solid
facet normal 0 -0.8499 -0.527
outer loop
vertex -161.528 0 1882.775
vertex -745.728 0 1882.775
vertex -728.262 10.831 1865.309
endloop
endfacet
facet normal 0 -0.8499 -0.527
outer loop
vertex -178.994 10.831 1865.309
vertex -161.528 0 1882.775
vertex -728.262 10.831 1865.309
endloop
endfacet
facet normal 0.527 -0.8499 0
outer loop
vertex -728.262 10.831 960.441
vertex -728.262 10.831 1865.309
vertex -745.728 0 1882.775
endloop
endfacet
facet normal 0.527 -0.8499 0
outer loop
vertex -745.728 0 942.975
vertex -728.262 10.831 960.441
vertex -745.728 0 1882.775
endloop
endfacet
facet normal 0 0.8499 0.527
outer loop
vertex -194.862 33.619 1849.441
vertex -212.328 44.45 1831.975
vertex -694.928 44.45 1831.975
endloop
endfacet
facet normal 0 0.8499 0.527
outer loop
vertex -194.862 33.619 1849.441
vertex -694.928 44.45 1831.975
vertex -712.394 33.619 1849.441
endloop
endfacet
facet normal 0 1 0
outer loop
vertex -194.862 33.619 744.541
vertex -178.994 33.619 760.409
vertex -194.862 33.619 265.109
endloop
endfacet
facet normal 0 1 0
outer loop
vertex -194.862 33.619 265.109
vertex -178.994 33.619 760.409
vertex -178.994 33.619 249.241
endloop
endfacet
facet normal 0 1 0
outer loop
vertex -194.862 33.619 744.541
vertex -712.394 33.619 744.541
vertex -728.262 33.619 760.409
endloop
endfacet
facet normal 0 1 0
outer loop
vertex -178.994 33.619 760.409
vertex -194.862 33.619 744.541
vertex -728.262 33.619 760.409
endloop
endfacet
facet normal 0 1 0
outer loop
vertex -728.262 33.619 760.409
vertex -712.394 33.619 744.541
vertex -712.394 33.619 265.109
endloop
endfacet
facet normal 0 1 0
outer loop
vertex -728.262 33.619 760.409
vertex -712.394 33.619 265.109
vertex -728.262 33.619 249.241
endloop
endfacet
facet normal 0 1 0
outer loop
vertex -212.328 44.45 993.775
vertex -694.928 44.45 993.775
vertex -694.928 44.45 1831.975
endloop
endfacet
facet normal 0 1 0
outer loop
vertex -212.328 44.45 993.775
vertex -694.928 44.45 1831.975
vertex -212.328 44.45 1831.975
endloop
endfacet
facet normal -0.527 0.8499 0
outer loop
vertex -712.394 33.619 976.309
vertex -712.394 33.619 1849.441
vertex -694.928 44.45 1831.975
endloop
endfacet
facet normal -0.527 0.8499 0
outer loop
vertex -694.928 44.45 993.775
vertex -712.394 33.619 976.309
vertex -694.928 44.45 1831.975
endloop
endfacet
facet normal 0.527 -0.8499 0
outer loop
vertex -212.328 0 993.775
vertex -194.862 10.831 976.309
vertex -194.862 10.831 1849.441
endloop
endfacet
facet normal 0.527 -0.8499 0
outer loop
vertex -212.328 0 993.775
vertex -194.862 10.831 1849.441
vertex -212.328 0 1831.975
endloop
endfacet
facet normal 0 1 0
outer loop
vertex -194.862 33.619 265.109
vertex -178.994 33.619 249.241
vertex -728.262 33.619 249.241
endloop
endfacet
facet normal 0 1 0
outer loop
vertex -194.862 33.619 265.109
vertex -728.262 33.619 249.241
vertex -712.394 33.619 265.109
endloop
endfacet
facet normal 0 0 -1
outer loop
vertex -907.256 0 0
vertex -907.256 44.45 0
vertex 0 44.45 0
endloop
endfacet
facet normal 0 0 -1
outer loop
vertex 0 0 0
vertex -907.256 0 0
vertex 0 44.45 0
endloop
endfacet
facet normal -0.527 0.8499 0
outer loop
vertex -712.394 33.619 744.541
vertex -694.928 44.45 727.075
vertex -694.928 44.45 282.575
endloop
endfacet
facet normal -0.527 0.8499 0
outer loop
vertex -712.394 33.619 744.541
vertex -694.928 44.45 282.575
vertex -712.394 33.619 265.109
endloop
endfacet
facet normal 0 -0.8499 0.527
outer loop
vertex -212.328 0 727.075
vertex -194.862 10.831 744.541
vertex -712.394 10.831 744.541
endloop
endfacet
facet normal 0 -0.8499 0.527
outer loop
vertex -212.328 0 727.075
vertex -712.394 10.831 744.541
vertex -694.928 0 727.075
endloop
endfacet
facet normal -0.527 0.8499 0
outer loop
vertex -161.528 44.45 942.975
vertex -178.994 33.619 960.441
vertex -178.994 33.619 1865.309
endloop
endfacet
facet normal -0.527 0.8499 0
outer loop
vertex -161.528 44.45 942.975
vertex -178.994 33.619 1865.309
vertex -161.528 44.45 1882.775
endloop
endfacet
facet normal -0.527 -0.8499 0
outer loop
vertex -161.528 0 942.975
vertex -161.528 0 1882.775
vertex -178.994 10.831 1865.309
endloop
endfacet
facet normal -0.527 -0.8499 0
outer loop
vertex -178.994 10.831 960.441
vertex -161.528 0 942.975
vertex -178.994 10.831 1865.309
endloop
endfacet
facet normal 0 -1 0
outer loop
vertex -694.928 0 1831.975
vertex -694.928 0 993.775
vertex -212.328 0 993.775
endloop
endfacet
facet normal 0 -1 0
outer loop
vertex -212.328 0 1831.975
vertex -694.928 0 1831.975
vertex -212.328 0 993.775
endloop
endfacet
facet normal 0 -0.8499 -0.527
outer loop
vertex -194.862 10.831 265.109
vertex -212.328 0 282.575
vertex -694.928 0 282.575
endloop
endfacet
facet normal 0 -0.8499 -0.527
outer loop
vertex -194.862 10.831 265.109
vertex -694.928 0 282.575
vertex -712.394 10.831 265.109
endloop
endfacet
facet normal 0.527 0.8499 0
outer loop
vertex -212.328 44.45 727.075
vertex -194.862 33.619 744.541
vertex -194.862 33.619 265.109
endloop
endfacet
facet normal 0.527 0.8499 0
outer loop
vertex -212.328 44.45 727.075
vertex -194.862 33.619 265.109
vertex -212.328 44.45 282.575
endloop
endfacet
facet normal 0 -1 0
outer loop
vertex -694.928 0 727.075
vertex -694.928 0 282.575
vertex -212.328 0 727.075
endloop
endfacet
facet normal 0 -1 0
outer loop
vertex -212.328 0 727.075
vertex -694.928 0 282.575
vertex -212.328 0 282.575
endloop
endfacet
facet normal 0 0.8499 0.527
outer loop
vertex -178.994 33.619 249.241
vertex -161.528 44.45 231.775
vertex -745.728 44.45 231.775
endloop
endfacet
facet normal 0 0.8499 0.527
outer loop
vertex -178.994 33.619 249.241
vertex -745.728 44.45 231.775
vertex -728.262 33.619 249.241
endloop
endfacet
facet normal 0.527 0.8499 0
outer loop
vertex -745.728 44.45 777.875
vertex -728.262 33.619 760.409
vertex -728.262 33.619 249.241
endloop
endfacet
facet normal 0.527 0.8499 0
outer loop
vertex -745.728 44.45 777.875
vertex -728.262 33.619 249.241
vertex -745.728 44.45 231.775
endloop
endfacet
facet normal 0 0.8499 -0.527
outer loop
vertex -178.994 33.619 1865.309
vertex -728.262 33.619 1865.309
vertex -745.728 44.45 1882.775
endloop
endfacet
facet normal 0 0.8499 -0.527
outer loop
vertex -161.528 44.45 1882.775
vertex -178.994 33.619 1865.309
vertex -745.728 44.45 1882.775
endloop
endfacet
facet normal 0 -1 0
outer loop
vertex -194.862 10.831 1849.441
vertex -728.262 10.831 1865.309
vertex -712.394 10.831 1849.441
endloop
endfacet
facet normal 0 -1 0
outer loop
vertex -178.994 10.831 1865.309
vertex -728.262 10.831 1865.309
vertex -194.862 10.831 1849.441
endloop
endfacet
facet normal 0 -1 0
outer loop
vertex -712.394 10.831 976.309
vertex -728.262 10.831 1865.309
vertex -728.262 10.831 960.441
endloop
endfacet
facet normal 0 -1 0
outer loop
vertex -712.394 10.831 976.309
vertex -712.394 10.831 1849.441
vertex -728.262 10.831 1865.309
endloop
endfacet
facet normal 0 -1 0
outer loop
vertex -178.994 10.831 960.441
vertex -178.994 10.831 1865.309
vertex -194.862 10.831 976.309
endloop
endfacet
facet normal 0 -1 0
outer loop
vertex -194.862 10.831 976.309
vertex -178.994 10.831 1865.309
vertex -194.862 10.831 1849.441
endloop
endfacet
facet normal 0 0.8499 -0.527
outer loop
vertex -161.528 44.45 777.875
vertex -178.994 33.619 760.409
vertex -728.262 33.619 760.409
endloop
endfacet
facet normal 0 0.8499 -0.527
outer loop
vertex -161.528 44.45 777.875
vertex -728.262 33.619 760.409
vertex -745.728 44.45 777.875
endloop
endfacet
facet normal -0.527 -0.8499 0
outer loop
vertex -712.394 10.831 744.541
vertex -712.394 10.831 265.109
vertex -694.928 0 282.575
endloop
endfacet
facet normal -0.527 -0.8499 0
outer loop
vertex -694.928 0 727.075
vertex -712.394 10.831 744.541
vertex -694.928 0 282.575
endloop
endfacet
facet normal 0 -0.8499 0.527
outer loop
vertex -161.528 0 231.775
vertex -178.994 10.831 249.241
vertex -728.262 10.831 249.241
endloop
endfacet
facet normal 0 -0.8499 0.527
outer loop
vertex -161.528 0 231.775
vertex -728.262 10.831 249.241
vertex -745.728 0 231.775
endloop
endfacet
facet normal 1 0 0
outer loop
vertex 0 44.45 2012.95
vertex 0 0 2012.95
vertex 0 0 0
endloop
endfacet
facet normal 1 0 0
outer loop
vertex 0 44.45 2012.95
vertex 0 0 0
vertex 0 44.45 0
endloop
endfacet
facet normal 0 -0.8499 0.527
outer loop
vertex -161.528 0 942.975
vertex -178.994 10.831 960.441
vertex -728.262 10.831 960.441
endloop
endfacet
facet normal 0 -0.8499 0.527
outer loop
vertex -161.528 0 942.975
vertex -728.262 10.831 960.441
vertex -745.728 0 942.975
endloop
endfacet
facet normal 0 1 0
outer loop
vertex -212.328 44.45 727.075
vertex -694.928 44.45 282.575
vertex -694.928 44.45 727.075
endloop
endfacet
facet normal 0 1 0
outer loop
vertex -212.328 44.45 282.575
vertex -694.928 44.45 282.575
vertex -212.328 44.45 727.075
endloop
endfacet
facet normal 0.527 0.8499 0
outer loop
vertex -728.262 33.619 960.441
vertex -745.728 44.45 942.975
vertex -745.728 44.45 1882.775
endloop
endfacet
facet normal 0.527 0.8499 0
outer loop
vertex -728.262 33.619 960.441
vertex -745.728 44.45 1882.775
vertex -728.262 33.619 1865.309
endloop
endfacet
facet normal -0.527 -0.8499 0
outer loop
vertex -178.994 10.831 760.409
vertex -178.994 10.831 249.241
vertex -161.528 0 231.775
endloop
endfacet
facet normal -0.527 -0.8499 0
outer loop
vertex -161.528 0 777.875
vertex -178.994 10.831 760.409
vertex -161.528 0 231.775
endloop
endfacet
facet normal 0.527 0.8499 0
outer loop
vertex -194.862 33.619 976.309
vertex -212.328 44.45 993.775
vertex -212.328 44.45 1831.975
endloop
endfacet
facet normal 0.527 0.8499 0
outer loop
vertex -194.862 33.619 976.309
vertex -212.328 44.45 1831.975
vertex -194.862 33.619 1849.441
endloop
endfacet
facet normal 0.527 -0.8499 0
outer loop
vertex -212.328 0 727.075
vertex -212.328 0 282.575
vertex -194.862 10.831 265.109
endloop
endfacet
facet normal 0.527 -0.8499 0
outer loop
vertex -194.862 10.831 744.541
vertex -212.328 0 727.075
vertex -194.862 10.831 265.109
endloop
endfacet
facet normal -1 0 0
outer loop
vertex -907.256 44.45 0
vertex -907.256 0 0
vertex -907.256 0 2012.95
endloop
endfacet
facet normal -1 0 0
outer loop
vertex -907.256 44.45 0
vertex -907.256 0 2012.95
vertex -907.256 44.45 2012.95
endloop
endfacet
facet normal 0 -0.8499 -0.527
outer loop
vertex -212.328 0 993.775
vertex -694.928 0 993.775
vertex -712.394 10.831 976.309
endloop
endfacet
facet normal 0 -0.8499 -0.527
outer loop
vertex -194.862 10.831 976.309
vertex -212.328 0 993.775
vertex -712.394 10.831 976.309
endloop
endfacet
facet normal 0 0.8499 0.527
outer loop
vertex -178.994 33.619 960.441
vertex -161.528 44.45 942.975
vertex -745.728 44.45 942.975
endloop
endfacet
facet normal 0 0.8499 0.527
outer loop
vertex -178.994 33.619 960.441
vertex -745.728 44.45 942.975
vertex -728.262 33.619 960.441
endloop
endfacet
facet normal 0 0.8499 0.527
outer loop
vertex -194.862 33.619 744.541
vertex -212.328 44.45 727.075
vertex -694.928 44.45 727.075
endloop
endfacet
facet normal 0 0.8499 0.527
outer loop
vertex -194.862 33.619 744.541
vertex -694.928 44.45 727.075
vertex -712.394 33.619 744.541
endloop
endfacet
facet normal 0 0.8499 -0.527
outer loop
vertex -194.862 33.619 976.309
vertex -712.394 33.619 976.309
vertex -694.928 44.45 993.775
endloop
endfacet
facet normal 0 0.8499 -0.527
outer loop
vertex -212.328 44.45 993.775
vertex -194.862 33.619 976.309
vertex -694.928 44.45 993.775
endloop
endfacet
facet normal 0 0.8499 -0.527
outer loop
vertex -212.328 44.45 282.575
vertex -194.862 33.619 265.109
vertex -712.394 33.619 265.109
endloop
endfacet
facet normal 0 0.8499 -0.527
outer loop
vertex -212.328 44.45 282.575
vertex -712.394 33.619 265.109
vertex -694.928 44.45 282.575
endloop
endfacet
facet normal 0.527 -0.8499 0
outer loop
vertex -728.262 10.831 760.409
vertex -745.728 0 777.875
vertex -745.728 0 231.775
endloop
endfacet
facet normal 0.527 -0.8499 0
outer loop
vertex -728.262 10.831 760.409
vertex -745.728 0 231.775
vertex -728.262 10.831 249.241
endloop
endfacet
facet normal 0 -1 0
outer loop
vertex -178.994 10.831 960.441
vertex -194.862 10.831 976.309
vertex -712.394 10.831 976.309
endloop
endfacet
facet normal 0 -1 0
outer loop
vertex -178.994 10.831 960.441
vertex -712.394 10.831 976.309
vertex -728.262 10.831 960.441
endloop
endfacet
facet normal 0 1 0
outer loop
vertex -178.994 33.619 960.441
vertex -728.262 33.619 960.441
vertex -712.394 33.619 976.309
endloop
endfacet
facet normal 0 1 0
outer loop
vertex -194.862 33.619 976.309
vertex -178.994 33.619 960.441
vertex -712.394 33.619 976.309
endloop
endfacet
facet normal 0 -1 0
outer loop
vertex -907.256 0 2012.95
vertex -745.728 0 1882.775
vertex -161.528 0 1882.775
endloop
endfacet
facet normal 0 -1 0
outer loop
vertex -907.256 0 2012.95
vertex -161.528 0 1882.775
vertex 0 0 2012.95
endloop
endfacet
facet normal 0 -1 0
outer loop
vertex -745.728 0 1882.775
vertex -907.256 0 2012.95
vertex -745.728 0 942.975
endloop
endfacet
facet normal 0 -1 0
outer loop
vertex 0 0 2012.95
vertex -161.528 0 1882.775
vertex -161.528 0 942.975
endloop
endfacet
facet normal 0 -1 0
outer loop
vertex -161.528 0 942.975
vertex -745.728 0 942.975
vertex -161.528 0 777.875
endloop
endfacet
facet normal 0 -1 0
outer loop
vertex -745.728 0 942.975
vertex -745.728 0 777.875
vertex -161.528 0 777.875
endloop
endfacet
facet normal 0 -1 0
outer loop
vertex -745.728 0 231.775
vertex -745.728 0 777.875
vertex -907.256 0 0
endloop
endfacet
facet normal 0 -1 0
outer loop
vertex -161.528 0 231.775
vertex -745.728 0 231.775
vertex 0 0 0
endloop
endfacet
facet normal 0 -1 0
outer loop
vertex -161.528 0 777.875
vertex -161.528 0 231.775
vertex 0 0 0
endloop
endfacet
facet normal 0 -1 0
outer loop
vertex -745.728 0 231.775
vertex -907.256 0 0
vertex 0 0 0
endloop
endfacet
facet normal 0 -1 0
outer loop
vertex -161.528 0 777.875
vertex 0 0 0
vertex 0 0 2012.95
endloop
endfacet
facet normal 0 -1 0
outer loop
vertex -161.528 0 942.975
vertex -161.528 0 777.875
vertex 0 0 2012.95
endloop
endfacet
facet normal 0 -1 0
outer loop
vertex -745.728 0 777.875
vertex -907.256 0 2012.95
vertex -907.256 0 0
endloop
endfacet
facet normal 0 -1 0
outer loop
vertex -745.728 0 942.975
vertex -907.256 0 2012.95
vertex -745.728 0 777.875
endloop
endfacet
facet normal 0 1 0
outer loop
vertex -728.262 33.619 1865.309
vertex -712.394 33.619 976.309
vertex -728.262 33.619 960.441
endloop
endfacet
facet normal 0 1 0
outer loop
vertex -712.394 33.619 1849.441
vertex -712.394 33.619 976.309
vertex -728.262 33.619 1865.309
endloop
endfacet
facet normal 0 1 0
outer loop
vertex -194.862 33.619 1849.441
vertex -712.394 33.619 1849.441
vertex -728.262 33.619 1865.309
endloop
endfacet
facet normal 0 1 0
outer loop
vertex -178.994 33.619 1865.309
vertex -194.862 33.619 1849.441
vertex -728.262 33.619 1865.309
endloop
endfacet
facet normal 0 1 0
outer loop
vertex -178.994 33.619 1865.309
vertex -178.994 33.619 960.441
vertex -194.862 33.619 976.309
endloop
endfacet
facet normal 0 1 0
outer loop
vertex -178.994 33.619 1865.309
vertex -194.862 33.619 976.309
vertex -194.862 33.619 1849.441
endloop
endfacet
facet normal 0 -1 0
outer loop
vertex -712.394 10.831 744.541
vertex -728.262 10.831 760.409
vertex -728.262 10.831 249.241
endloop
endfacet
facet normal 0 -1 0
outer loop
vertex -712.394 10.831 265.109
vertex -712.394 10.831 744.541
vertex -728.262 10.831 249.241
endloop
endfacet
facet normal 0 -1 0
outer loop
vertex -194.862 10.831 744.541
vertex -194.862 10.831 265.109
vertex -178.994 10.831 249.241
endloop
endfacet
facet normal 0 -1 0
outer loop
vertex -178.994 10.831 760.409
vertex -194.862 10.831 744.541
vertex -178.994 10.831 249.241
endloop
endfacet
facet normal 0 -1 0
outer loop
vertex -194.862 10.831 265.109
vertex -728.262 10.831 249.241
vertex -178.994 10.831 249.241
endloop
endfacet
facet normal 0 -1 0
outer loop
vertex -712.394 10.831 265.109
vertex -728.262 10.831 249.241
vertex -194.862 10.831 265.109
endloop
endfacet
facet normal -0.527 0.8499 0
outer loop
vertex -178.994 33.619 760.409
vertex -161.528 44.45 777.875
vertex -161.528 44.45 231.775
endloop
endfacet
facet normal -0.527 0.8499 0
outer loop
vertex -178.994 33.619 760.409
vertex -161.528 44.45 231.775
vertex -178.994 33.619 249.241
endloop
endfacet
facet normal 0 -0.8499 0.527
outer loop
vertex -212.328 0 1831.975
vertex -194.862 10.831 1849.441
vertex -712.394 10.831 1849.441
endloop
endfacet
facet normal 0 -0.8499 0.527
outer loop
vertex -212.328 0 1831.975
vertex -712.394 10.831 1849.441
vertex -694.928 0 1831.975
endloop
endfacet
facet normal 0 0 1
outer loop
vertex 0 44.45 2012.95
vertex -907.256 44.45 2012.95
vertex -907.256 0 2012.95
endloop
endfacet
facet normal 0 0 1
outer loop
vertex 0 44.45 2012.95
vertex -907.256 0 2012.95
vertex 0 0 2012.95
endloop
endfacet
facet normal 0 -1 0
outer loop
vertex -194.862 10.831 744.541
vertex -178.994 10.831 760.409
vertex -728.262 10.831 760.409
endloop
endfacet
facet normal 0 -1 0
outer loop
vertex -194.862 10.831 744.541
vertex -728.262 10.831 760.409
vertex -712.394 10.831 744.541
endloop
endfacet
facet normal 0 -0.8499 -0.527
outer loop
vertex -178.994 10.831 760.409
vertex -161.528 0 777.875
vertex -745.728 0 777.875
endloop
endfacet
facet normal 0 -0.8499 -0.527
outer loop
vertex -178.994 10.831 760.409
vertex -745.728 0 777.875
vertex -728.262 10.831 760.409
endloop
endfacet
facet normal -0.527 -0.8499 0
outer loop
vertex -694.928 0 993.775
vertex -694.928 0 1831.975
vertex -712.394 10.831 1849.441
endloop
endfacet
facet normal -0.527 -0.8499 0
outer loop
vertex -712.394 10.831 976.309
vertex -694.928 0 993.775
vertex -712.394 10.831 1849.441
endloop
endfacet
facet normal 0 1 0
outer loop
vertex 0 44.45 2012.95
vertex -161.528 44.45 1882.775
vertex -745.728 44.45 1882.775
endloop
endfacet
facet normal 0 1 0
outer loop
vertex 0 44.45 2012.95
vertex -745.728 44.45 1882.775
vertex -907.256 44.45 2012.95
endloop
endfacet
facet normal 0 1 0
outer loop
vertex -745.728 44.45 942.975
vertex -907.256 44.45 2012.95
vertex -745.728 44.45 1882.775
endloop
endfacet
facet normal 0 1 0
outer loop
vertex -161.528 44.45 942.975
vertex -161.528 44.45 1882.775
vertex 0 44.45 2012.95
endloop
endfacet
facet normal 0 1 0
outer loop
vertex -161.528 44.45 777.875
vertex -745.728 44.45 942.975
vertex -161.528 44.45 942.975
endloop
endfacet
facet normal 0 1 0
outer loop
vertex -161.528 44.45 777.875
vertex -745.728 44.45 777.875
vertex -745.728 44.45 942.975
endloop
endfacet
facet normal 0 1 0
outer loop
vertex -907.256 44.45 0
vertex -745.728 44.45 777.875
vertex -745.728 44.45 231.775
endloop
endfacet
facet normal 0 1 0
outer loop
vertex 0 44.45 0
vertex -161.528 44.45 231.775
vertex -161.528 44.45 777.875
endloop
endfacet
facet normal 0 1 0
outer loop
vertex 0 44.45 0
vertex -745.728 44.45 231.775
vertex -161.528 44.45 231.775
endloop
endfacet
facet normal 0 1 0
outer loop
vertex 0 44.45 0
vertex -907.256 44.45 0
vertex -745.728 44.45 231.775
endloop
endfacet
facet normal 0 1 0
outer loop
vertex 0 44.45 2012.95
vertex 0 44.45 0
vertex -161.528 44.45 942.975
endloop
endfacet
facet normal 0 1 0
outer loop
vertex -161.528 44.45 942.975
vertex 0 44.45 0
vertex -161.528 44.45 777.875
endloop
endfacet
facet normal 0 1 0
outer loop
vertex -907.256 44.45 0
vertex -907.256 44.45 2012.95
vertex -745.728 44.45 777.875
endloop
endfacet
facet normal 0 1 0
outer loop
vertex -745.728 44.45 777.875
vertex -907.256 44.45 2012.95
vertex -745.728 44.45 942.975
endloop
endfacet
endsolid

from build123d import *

# Parameters (mm, degrees)
F0_W      = 907.25625
F0_H      = 44.45
F1_DEPTH  = 2012.95
F2_W      = 584.2
F2_H      = 546.1
F3_DEPTH  = 44.451
F8_DEPTH  = 939.8
F9_DEPTH  = 546.1
F11_DEPTH = 44.451
F13_DEPTH = 907.25625
F15_DEPTH = 44.4510000001
F17_W     = 482.6000000008
F17_H     = 44.4500000001
F18_DEPTH = 838.2
F19_W     = 482.6000000007
F19_H     = 44.45
F20_DEPTH = 444.5


with BuildPart() as f1:
    # F0 (on Top) → F1 (new body)
    with BuildSketch(Plane.XY):
        with Locations((-453.628125, 22.225)):
            Rectangle(F0_W, F0_H)
    extrude(amount=F1_DEPTH)

    # F2 (on Front) → F3 (cut, through all)
    with BuildSketch(Plane.XZ):
        Polygon((-745.728125, 1882.775), (-745.728125, 942.975), (-161.528125, 942.975), (-161.528125, 1882.775), (-453.628125, 1882.775), align=None)
        with Locations((-453.628125, 504.825)):
            Rectangle(F2_W, F2_H)
    extrude(amount=-F3_DEPTH, mode=Mode.SUBTRACT)

    # F6 (on face) → F8 (join, through all)
    with BuildSketch(Plane(origin=(0, 0, 1882.775), x_dir=(1, 0, 0), z_dir=(0, 0, -1))):
        Polygon((-694.928125, -22.225), (-694.928125, 0), (-712.3942085743, -10.8310357451), (-720.328125, -10.8310357451), (-728.2620414257, -10.8310357451), (-745.728125, 0), (-745.728125, -22.225), (-745.728125, -44.45), (-728.2620414257, -33.6189642549), (-720.328125, -33.6189642549), (-712.3942085743, -33.6189642549), (-694.928125, -44.45), align=None)
        Polygon((-212.328125, -22.225), (-212.328125, -44.45), (-194.8620414257, -33.6189642549), (-186.928125, -33.6189642549), (-178.9942085743, -33.6189642549), (-161.528125, -44.45), (-161.528125, -22.225), (-161.528125, 0), (-178.9942085743, -10.8310357451), (-186.928125, -10.8310357451), (-194.8620414257, -10.8310357451), (-212.328125, 0), align=None)
    extrude(amount=F8_DEPTH)

    # F7 (on face) → F9 (join, through all)
    with BuildSketch(Plane.XY.offset(231.775)):
        Polygon((-745.728125, 22.225), (-745.728125, 0), (-728.2620414257, 10.8310357451), (-720.328125, 10.8310357451), (-712.3942085743, 10.8310357451), (-694.928125, 0), (-694.928125, 22.225), (-694.928125, 44.45), (-712.3942085743, 33.6189642549), (-720.328125, 33.6189642549), (-728.2620414257, 33.6189642549), (-745.728125, 44.45), align=None)
        Polygon((-212.328125, 44.45), (-212.328125, 22.225), (-212.328125, 0), (-194.8620414257, 10.8310357451), (-186.928125, 10.8310357451), (-178.9942085743, 10.8310357451), (-161.528125, 0), (-161.528125, 22.225), (-161.528125, 44.45), (-178.9942085743, 33.6189642549), (-186.928125, 33.6189642549), (-194.8620414257, 33.6189642549), align=None)
    extrude(amount=F9_DEPTH)

    # F10 (on Front) → F11 (cut, through all)
    with BuildSketch(Plane.XZ):
        Polygon((-745.728125, 1882.775), (-453.628125, 1590.675), (-161.528125, 1882.775), (-212.328125, 1882.775), (-694.928125, 1882.775), align=None)
        Polygon((-161.528125, 942.975), (-453.628125, 1235.075), (-745.728125, 942.975), (-694.928125, 942.975), (-212.328125, 942.975), align=None)
        Polygon((-161.528125, 777.875), (-212.328125, 777.875), (-694.928125, 777.875), (-745.728125, 777.875), (-472.678125, 504.825), (-453.628125, 523.875), (-434.578125, 504.825), align=None)
        Polygon((-161.528125, 231.775), (-434.578125, 504.825), (-453.628125, 485.775), (-472.678125, 504.825), (-745.728125, 231.775), (-694.928125, 231.775), (-212.328125, 231.775), align=None)
        Polygon((-453.628125, 485.775), (-434.578125, 504.825), (-453.628125, 523.875), (-472.678125, 504.825), align=None)
    extrude(amount=-F11_DEPTH, mode=Mode.SUBTRACT)


with BuildPart() as f13:
    # F12 (on Right) → F13 (new body, through all)
    with BuildSketch(Plane.YZ):
        Polygon((44.45, 1882.775), (0, 1882.775), (10.8310357451, 1865.3089164258), (10.8310357451, 1849.4410835743), (0, 1831.975), (44.45, 1831.975), (33.6189642549, 1849.4410835743), (33.6189642549, 1865.3089164256), align=None)
    extrude(amount=-F13_DEPTH)


with BuildPart() as f13b:
    # F12 (on Right) → F13, piece 2 (new body, through all)
    with BuildSketch(Plane.YZ):
        Polygon((10.8310357452, 960.4410835743), (1e-10, 942.9750000002), (44.45, 942.975), (33.6189642548, 960.4410835744), (33.6189642549, 976.3089164258), (44.45, 993.775), (0, 993.775), (10.831035745, 976.308916426), align=None)
    extrude(amount=-F13_DEPTH)


with BuildPart() as f13c:
    # F12 (on Right) → F13, piece 3 (new body, through all)
    with BuildSketch(Plane.YZ):
        Polygon((33.6189642549, 744.5410835742), (33.6189642549, 760.4089164257), (44.4499999998, 777.8749999997), (0, 777.875), (10.831035745, 760.4089164259), (10.8310357451, 744.5410835743), (1e-10, 727.0750000001), (44.45, 727.075), align=None)
    extrude(amount=-F13_DEPTH)


with BuildPart() as f13d:
    # F12 (on Right) → F13, piece 4 (new body, through all)
    with BuildSketch(Plane.YZ):
        Polygon((44.45, 231.7749999998), (33.618964255, 249.241083574), (33.6189642549, 265.1089164257), (44.4499999999, 282.5749999998), (0, 282.575), (10.8310357451, 265.1089164258), (10.8310357451, 249.2410835743), (0, 231.7750000002), align=None)
    extrude(amount=-F13_DEPTH)


with BuildPart() as f15_tool:
    # F14 (on Front) → F15 (new body, through all)
    with BuildSketch(Plane.XZ):
        Polygon((-745.728125, 777.875), (-745.728125, 231.775), (-472.678125, 504.825), align=None)
        Polygon((-161.528125, 777.875), (-434.578125, 504.825), (-161.528125, 231.775), align=None)
        Polygon((-453.628125, 523.875), (-472.678125, 504.825), (-453.628125, 485.775), (-434.578125, 504.825), align=None)
        Polygon((-161.528125, 1882.775), (-453.628125, 1590.675), (-745.728125, 1882.775), (-745.728125, 942.975), (-453.628125, 1235.075), (-161.528125, 942.975), align=None)
    extrude(amount=-F15_DEPTH)


with BuildPart() as f13_1:
    add(f13.part)

    # F15: cut by f15_tool
    add(f15_tool.part, mode=Mode.SUBTRACT)


with BuildPart() as f13b_1:
    add(f13b.part)

    # F15: cut by f15_tool
    add(f15_tool.part, mode=Mode.SUBTRACT)


with BuildPart() as f13c_1:
    add(f13c.part)

    # F15: cut by f15_tool
    add(f15_tool.part, mode=Mode.SUBTRACT)


with BuildPart() as f13d_1:
    add(f13d.part)

    # F15: cut by f15_tool
    add(f15_tool.part, mode=Mode.SUBTRACT)


with BuildPart() as f1_1:
    add(f1.part)

    # F16: union F13, F13b, F13c, F13d
    add(f13_1.part)
    add(f13b_1.part)
    add(f13c_1.part)
    add(f13d_1.part)

    # F17 (on face) → F18 (join, through all)
    with BuildSketch(Plane.XY.offset(993.775)):
        with Locations((-453.6281250004, 22.2249999999)):
            Rectangle(F17_W, F17_H)
    extrude(amount=F18_DEPTH)

    # F19 (on face) → F20 (join, through all)
    with BuildSketch(Plane.XY.offset(282.575)):
        with Locations((-453.6281250003, 22.225)):
            Rectangle(F19_W, F19_H)
    extrude(amount=F20_DEPTH)


solid = f1_1.part
